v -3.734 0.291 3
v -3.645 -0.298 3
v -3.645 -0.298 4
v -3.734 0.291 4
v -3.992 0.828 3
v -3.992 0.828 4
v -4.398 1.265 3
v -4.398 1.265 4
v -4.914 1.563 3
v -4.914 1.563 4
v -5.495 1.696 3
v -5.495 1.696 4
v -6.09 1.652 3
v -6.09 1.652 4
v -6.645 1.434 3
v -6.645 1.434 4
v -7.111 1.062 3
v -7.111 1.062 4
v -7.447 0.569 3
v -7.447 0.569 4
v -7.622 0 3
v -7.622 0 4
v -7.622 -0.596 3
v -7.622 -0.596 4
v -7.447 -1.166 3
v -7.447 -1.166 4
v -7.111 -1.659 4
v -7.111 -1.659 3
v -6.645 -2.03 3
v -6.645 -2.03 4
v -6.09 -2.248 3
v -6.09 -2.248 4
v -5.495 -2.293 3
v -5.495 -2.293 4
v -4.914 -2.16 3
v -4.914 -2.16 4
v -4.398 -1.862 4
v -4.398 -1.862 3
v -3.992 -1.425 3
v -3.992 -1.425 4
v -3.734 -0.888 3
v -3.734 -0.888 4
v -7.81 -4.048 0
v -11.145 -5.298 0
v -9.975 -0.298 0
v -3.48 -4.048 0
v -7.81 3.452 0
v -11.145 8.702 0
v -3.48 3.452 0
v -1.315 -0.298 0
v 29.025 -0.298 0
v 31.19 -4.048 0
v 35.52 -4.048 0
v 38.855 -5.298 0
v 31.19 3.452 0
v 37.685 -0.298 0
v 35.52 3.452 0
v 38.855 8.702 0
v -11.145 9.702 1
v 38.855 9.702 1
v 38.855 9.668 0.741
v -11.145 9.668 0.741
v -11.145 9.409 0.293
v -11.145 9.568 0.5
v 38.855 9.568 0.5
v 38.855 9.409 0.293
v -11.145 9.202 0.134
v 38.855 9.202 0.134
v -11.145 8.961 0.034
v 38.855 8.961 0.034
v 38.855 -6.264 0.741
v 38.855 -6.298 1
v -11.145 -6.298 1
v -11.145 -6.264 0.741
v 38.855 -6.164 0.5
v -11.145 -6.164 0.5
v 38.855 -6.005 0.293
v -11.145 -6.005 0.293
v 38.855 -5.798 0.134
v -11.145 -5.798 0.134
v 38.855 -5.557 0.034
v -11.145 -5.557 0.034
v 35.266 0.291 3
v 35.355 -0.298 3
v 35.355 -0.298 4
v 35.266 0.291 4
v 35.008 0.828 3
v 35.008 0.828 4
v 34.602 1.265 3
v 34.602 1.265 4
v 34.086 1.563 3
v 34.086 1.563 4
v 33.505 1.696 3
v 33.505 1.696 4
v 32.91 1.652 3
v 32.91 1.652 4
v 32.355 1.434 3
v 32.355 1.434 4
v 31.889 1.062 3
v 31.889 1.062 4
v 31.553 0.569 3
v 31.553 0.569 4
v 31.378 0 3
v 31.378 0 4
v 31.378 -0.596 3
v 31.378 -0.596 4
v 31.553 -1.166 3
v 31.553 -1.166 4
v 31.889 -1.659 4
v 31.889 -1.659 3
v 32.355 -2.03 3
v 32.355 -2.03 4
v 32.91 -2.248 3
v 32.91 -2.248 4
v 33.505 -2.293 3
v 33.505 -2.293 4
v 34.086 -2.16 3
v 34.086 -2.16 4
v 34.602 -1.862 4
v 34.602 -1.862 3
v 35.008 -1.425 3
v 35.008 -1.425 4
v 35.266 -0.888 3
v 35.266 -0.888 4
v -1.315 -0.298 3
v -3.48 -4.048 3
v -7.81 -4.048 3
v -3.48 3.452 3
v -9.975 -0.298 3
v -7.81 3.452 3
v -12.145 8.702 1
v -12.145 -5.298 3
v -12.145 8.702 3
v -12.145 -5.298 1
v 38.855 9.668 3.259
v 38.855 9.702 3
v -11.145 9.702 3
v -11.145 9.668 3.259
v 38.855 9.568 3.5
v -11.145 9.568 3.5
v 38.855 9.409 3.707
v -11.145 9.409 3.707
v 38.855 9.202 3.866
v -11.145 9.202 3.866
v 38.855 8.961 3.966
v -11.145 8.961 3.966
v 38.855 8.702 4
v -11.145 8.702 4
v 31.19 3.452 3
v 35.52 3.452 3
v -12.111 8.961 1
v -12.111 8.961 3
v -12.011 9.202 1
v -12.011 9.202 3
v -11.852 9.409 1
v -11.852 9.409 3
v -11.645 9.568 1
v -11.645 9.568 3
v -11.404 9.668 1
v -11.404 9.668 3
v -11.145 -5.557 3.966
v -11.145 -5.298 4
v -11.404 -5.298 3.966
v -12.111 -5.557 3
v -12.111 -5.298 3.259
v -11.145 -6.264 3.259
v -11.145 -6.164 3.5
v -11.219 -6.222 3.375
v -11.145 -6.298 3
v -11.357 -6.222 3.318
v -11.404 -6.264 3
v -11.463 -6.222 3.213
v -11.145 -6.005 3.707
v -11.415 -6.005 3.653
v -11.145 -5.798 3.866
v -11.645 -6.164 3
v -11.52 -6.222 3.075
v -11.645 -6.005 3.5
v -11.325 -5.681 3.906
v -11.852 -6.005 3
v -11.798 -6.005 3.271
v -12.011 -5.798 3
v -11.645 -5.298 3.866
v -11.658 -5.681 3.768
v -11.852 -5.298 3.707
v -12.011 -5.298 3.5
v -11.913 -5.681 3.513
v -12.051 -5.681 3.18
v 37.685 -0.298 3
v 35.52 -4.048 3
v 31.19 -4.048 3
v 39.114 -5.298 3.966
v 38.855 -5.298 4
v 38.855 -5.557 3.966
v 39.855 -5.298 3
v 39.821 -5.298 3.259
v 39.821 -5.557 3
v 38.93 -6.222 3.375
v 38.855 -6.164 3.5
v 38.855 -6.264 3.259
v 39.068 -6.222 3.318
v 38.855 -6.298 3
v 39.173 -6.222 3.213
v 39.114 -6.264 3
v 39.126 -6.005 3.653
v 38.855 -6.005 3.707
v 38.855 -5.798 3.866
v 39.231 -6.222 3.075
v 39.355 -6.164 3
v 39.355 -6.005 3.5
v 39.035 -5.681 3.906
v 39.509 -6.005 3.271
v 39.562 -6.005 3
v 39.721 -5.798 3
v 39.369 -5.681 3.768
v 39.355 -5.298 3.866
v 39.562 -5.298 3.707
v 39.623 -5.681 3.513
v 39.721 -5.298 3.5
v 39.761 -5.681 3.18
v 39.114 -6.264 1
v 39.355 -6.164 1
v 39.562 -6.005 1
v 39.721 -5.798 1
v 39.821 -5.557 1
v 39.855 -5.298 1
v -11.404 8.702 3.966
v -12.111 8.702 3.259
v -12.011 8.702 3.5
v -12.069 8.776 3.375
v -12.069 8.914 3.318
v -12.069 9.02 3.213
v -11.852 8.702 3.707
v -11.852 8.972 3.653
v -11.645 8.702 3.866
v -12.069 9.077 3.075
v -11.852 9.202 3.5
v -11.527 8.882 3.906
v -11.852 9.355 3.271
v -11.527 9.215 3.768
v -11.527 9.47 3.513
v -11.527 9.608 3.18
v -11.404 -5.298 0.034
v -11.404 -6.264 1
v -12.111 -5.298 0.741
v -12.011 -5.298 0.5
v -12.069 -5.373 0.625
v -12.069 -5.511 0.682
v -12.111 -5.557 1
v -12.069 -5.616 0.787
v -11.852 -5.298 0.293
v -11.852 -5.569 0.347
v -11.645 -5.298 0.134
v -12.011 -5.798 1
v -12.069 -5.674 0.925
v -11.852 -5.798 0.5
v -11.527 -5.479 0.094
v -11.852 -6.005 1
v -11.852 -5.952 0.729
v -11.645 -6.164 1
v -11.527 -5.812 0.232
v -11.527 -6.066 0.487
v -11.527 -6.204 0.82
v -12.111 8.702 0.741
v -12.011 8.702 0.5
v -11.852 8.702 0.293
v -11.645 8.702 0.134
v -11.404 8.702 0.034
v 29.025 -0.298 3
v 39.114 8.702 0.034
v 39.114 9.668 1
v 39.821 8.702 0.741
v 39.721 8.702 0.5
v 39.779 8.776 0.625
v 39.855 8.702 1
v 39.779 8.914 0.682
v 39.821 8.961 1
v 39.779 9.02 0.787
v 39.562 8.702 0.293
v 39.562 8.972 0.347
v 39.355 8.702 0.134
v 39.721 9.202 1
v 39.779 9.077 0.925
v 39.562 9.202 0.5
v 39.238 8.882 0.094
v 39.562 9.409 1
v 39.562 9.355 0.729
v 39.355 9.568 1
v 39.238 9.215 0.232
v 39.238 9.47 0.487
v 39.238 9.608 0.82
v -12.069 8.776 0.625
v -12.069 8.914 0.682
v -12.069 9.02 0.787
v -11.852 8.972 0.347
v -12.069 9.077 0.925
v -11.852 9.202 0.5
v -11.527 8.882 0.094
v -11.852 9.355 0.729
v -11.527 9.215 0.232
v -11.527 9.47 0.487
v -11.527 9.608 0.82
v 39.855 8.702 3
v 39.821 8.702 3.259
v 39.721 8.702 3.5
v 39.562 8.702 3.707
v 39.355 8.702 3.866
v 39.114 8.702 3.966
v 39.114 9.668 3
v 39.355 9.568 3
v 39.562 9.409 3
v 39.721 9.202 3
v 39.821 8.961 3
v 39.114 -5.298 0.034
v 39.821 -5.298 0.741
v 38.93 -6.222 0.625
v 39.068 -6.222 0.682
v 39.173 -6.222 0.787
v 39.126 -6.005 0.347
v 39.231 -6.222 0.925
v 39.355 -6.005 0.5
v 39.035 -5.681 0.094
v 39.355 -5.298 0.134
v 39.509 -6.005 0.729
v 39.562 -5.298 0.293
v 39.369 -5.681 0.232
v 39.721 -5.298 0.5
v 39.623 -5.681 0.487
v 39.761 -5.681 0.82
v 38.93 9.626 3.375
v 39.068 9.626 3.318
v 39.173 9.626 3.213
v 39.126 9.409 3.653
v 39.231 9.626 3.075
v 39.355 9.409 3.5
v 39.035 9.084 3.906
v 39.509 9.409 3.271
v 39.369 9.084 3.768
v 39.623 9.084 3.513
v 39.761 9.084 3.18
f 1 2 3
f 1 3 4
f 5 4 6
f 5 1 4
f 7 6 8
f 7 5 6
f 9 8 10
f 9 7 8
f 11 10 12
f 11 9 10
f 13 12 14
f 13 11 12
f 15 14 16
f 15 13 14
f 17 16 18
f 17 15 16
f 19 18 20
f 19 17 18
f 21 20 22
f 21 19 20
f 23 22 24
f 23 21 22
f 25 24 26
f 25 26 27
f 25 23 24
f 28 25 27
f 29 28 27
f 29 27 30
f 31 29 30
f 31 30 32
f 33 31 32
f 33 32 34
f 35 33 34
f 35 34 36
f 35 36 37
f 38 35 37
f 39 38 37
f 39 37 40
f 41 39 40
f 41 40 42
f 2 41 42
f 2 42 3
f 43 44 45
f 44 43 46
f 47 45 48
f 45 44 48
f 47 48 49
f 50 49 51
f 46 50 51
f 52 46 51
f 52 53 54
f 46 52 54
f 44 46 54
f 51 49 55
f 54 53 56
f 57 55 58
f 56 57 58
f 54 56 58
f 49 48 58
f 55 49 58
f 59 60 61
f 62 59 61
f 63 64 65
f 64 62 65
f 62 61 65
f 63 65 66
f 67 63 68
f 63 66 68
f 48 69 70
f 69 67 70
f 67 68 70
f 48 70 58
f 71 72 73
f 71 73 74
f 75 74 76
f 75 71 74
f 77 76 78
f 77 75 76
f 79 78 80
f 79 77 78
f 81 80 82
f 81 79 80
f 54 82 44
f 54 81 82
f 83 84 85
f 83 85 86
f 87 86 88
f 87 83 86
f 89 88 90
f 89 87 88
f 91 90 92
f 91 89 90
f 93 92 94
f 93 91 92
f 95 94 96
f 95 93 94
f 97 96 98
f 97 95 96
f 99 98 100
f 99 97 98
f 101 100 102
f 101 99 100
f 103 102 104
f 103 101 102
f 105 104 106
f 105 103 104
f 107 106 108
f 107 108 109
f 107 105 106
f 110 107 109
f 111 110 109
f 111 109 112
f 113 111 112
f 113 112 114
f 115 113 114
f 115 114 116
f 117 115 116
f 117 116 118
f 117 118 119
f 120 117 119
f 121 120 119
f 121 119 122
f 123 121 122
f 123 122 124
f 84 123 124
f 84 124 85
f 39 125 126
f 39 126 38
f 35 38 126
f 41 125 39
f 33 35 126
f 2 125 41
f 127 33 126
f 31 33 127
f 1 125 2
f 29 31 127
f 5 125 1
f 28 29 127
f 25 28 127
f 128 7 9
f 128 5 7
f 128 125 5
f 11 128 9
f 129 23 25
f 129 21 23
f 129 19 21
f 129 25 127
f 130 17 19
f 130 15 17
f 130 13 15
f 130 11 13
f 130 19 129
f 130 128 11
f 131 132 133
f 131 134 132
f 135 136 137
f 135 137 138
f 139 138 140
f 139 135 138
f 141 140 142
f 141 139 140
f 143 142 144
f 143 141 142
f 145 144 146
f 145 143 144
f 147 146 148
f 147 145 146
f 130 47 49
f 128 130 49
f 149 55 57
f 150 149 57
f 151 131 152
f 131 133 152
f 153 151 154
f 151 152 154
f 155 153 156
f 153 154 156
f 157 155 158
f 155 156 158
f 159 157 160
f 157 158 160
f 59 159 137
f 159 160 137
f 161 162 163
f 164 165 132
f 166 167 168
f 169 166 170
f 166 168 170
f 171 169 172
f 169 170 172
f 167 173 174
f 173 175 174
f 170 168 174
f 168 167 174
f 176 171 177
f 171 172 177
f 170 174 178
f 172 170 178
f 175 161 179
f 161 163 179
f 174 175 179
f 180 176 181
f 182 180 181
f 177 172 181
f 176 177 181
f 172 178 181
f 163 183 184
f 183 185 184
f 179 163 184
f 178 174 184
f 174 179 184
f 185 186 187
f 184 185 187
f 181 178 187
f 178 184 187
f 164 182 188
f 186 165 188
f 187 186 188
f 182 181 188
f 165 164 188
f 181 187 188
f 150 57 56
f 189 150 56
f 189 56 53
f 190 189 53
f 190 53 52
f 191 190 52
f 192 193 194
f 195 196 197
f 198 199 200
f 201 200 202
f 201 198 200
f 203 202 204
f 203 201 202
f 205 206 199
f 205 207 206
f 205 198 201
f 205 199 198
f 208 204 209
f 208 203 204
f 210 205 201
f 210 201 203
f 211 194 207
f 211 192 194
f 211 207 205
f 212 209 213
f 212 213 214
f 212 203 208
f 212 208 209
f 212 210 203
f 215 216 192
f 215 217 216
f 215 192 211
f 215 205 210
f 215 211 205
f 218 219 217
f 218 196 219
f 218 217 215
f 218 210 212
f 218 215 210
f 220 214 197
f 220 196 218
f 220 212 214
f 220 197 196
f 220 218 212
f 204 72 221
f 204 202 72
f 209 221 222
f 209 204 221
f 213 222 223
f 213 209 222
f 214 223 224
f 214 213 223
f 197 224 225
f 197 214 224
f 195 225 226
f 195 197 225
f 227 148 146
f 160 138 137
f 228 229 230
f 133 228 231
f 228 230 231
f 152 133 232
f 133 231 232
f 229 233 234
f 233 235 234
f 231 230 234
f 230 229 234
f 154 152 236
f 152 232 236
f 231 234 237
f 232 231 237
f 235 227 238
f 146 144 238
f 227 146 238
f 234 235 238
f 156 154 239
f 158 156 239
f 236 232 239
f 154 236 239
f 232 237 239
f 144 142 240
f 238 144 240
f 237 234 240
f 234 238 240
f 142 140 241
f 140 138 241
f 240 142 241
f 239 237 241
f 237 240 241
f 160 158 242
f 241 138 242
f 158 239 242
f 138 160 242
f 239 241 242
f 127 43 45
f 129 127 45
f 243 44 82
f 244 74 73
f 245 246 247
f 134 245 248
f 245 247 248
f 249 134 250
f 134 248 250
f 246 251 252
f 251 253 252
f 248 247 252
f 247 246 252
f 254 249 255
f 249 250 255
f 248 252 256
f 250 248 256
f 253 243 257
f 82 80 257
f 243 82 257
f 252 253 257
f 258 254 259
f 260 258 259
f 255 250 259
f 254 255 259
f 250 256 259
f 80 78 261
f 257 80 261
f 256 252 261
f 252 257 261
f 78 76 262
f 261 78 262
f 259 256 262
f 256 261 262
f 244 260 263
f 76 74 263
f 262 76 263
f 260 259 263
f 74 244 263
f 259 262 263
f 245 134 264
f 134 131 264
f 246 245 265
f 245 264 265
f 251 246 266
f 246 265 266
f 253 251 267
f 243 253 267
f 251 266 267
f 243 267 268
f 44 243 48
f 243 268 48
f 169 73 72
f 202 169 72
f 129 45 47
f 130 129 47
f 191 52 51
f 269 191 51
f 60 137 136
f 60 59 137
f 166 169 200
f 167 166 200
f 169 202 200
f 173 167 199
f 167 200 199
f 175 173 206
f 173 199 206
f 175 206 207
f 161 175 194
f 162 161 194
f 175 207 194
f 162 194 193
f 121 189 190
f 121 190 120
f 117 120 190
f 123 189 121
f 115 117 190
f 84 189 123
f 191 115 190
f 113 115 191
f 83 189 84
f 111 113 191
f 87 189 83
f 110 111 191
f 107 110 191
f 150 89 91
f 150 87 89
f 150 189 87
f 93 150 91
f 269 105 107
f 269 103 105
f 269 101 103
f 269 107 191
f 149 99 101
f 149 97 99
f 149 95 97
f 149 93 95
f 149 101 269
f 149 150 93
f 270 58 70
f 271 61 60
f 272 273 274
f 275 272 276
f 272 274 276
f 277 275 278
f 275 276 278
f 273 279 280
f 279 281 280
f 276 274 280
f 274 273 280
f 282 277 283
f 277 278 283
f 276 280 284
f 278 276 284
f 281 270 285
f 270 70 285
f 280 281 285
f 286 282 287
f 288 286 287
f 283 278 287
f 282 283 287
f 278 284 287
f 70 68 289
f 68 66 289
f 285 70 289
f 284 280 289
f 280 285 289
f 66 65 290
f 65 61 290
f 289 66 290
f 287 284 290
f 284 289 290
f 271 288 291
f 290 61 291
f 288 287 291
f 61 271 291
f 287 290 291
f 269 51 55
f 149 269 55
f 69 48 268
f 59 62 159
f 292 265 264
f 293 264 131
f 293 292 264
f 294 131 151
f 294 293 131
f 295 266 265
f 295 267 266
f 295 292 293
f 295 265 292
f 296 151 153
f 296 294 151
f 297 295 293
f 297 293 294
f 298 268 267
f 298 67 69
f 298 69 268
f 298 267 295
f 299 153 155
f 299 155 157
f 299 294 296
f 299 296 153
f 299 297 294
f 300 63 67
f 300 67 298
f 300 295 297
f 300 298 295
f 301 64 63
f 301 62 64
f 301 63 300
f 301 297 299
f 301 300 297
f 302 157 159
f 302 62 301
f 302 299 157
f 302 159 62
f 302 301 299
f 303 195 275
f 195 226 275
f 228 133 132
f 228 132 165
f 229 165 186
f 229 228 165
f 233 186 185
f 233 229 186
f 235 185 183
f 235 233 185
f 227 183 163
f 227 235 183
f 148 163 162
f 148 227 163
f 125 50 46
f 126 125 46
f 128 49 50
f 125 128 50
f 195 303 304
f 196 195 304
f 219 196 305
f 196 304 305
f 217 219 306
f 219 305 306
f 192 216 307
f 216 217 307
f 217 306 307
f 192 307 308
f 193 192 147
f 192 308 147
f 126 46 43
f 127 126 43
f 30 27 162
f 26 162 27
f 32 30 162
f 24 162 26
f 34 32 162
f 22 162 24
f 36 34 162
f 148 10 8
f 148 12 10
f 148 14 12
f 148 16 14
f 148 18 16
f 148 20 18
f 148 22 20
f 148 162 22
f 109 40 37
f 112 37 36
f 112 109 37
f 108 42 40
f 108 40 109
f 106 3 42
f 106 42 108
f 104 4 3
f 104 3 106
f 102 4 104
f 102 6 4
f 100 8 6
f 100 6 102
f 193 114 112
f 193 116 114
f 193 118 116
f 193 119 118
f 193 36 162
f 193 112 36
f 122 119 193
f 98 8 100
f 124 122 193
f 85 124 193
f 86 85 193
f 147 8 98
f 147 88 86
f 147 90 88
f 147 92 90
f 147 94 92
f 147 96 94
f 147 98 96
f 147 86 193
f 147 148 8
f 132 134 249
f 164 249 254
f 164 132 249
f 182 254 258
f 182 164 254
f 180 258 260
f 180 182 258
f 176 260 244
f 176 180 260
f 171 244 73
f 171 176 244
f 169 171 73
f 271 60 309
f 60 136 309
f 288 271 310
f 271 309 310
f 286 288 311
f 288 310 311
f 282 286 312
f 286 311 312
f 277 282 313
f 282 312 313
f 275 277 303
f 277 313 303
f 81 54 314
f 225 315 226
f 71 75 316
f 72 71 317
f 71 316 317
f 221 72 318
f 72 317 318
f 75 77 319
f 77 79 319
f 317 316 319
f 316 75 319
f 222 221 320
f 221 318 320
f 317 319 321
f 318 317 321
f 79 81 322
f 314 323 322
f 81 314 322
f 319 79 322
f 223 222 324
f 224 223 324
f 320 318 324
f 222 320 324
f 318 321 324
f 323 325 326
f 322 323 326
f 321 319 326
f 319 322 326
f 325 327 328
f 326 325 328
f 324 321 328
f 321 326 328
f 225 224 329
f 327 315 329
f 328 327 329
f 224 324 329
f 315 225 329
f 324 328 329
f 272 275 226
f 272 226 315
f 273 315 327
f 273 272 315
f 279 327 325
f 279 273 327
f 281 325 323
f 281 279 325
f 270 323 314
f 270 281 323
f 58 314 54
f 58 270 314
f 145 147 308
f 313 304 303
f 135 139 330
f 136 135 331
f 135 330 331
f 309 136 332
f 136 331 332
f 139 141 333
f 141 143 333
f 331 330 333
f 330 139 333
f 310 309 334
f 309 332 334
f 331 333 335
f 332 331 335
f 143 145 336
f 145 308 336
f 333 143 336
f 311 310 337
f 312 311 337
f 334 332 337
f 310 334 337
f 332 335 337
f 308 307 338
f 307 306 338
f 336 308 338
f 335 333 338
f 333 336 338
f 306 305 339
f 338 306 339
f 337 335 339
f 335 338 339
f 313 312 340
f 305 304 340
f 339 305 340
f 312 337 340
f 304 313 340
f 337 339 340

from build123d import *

# Parameters (mm, degrees)
SKETCH1_W           = 52
SKETCH1_H           = 16
SKETCH1_R           = 2
BOSS_EXTRUDE1_DEPTH = 4
FILLET1_R           = 1
CUT_EXTRUDE1_DEPTH  = 3


with BuildPart() as part:
    # Sketch1 → Boss-Extrude1 (new body)
    with BuildSketch(Plane.XY):
        with Locations((13.855253101, 1.7017189)):
            Rectangle(SKETCH1_W, SKETCH1_H)
        with Locations((-5.644746899, -0.2982811)):
            Circle(SKETCH1_R, mode=Mode.SUBTRACT)
        with Locations((33.355253101, -0.2982811)):
            Circle(SKETCH1_R, mode=Mode.SUBTRACT)
    extrude(amount=BOSS_EXTRUDE1_DEPTH)

    # Fillet1
    fillet1_edges = [part.edges().sort_by_distance(p)[0] for p in [
        (39.855253101, 1.7017189, 4),
        (13.855253101, 9.7017189, 4),
        (-12.144746899, 1.7017189, 4),
        (13.855253101, 9.7017189, 0),
        (39.855253101, 1.7017189, 0),
        (13.855253101, -6.2982811, 0),
        (-12.144746899, 1.7017189, 0),
        (13.855253101, -6.2982811, 4),
        (-12.144746899, 9.7017189, 2),
        (39.855253101, 9.7017189, 2),
        (39.855253101, -6.2982811, 2),
        (-12.144746899, -6.2982811, 2),
    ]]
    fillet(fillet1_edges, radius=FILLET1_R)

    # Sketch5 → Cut-Extrude1 (cut)
    with BuildSketch(Plane(origin=(0, 0, 0), x_dir=(-1, 0, 0), z_dir=(0, 0, -1))):
        Polygon((-29.025126082, -0.2982811), (-31.190189592, 3.4517189), (-35.520316611, 3.4517189), (-37.68538012, -0.2982811), (-35.520316611, -4.0482811), (-31.190189592, -4.0482811), align=None)
        Polygon((1.31461988, -0.2982811), (3.479683389, -4.0482811), (7.809810408, -4.0482811), (9.974873918, -0.2982811), (7.809810408, 3.4517189), (3.479683389, 3.4517189), align=None)
    extrude(amount=-CUT_EXTRUDE1_DEPTH, mode=Mode.SUBTRACT)


solid = part.part
